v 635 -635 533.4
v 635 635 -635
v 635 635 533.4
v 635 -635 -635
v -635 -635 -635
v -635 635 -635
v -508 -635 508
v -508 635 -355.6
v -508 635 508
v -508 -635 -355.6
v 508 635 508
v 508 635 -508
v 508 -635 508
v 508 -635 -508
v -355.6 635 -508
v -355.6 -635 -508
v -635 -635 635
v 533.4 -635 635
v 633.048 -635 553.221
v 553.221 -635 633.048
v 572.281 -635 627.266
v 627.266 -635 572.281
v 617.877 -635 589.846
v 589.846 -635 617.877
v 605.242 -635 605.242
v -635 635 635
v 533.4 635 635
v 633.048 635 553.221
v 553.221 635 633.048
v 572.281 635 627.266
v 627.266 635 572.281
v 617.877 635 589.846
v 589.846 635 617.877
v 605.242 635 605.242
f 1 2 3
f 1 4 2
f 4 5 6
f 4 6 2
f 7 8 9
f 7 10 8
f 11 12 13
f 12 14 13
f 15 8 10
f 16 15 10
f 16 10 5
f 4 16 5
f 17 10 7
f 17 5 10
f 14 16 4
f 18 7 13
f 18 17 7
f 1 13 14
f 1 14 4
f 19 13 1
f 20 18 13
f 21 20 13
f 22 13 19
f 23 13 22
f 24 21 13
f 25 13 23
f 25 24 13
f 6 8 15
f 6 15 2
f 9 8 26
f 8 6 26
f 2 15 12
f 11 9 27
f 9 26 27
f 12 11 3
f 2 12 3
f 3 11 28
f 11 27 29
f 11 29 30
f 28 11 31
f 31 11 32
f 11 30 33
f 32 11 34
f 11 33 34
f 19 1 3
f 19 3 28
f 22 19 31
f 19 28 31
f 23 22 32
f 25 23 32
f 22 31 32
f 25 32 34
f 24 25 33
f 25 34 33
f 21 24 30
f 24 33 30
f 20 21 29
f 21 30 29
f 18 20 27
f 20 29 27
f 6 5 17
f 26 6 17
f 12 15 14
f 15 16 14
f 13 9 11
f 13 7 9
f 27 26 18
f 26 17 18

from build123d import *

# Parameters (mm, degrees)
F0_W     = 1270
F0_H     = 1270
F0_W_2   = 1016
F0_H_2   = 1016
F1_DEPTH = 635
F2_R     = 101.6
F3_SIZE  = 152.4


with BuildPart() as f1:
    # F0 (on Front) → F1 (new body, symmetric)
    with BuildSketch(Plane.XZ):
        Rectangle(F0_W, F0_H)
        Rectangle(F0_W_2, F0_H_2, mode=Mode.SUBTRACT)
    extrude(amount=F1_DEPTH, both=True)

    # F2
    f2_edges = [f1.edges().sort_by_distance(p)[0] for p in [
        (635, 0, 635),
    ]]
    fillet(f2_edges, radius=F2_R)

    # F3
    f3_edges = [f1.edges().sort_by_distance(p)[0] for p in [
        (-508, 0, -508),
    ]]
    chamfer(f3_edges, length=F3_SIZE)


solid = f1.part
